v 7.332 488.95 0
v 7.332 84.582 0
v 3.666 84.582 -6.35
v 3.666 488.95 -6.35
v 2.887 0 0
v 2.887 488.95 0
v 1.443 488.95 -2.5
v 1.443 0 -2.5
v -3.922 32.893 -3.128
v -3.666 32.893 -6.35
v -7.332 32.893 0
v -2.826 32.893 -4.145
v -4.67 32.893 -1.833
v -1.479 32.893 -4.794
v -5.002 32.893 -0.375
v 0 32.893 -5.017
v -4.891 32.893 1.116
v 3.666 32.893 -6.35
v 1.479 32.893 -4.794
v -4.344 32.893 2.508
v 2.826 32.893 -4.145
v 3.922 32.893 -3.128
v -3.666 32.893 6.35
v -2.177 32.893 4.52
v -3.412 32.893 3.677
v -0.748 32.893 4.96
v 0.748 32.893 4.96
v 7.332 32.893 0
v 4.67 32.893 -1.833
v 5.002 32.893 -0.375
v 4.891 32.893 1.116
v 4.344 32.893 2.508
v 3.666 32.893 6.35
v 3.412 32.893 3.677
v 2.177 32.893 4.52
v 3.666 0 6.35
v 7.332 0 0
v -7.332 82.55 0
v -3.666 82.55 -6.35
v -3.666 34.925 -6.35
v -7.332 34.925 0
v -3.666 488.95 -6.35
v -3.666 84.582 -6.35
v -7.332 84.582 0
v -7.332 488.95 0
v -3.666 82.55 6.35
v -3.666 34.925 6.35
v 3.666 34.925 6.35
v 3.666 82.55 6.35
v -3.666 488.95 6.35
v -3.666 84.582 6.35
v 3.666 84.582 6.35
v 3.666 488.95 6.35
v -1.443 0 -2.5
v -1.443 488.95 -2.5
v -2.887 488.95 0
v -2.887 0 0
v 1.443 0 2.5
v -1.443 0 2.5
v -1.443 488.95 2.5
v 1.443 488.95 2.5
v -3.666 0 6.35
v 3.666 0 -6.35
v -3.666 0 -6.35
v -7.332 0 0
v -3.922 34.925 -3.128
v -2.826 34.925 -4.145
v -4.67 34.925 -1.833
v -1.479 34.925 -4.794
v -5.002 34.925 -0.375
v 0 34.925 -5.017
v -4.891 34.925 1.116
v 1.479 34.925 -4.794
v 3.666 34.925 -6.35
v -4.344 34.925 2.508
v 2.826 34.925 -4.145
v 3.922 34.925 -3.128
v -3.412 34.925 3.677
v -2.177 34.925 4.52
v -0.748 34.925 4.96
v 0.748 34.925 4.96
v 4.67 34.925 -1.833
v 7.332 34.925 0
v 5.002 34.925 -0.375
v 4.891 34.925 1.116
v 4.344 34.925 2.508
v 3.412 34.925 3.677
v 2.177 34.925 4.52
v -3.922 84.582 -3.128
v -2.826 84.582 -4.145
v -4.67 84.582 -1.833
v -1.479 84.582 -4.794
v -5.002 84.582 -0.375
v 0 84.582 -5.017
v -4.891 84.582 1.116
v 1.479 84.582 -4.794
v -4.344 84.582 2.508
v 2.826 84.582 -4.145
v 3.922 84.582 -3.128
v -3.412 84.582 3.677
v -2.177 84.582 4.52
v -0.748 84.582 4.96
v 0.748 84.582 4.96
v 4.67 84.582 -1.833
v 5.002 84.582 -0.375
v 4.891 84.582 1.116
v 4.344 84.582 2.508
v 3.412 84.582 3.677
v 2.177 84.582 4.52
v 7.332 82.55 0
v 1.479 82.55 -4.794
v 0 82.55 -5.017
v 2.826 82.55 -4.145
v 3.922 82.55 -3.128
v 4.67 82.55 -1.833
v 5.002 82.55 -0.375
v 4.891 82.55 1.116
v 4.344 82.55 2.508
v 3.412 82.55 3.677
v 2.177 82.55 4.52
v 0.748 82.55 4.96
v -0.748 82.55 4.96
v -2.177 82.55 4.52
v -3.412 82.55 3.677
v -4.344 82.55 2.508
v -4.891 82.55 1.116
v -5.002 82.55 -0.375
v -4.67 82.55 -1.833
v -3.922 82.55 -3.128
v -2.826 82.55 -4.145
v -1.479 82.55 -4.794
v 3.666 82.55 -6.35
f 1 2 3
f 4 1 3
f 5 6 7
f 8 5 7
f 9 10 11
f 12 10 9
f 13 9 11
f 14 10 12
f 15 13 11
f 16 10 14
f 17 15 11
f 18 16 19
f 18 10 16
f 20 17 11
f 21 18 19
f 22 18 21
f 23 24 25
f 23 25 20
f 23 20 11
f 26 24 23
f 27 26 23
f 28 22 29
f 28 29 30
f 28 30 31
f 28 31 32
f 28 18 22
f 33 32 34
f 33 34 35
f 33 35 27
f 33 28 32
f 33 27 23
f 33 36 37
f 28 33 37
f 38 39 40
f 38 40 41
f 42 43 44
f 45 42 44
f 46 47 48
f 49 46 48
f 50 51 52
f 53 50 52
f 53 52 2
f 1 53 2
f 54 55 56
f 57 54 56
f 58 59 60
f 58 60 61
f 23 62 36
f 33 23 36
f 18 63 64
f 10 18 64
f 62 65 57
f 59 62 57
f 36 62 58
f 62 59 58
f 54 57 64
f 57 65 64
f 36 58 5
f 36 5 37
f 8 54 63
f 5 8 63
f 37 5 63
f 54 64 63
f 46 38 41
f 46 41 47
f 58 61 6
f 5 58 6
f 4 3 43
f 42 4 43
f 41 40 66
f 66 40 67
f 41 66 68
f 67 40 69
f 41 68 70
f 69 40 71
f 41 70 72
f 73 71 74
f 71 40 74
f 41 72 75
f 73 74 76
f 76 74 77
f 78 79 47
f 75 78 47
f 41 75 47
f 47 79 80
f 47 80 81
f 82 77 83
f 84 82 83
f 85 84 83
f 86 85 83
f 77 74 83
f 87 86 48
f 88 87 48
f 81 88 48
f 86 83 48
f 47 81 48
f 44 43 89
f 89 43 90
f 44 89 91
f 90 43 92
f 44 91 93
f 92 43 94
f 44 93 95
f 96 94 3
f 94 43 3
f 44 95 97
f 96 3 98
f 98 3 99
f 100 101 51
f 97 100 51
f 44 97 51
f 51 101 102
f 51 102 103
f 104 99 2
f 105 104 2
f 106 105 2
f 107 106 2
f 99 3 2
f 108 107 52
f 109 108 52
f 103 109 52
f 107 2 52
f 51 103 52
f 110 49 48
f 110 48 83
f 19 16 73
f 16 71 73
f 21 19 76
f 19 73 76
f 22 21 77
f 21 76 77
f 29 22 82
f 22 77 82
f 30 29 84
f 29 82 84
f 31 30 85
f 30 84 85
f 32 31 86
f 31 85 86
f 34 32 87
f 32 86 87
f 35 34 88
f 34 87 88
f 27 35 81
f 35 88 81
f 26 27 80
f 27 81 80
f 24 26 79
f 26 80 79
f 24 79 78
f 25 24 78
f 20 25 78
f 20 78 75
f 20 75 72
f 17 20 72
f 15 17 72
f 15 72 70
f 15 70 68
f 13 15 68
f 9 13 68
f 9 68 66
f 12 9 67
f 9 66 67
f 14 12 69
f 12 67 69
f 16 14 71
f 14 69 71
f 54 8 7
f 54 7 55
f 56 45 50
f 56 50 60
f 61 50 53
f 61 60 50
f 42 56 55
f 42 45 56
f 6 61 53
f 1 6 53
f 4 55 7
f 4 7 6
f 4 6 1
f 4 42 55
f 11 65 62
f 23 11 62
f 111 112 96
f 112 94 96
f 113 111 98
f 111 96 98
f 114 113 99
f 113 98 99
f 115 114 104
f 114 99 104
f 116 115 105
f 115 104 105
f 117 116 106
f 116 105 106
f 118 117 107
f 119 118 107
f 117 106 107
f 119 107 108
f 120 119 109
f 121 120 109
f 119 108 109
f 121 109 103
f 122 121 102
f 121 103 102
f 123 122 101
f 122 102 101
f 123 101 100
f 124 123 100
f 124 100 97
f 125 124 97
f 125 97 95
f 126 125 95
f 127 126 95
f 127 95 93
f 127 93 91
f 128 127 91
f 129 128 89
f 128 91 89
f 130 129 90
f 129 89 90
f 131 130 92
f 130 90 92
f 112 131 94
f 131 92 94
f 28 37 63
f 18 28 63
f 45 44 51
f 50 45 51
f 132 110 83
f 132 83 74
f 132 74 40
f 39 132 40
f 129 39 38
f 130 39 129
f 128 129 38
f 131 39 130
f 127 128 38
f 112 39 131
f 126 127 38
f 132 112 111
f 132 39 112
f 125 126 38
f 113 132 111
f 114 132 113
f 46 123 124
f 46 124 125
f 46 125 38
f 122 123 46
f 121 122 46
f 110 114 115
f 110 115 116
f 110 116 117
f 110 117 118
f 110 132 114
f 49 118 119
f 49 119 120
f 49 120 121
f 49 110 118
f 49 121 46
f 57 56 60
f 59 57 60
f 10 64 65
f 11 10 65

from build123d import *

# Parameters (mm, degrees)
BOSS_EXTRUDE1_DEPTH = 488.95
SKETCH3_W           = 2.54
SKETCH3_H           = 2.032


with BuildPart() as part:
    # Sketch1 → Boss-Extrude1 (new body)
    with BuildSketch(Plane(origin=(0, 0, 0), x_dir=(1, 0, 0), z_dir=(0, 1, 0))):
        Polygon((7.332348419, 0), (3.666174209, 6.35), (-3.666174209, 6.35), (-7.332348419, 0), (-3.666174209, -6.35), (3.666174209, -6.35), align=None)
        Polygon((1.443375673, 2.5), (-1.443375673, 2.5), (-2.886751346, 0), (-1.443375673, -2.5), (1.443375673, -2.5), (2.886751346, 0), align=None, mode=Mode.SUBTRACT)
    extrude(amount=BOSS_EXTRUDE1_DEPTH)

    # Sketch3 → Cut-Revolve2 (revolve, cut)
    with BuildSketch(Plane(origin=(0, 0, 0), x_dir=(0, 0, -1), z_dir=(1, 0, 0))):
        with Locations((6.2865, 83.566)):
            Rectangle(SKETCH3_W, SKETCH3_H)
        with Locations((6.2865, 33.909)):
            Rectangle(SKETCH3_W, SKETCH3_H)
    revolve(axis=Axis((0, 488.95, 0), (0, -1, 0)), mode=Mode.SUBTRACT)


solid = part.part
